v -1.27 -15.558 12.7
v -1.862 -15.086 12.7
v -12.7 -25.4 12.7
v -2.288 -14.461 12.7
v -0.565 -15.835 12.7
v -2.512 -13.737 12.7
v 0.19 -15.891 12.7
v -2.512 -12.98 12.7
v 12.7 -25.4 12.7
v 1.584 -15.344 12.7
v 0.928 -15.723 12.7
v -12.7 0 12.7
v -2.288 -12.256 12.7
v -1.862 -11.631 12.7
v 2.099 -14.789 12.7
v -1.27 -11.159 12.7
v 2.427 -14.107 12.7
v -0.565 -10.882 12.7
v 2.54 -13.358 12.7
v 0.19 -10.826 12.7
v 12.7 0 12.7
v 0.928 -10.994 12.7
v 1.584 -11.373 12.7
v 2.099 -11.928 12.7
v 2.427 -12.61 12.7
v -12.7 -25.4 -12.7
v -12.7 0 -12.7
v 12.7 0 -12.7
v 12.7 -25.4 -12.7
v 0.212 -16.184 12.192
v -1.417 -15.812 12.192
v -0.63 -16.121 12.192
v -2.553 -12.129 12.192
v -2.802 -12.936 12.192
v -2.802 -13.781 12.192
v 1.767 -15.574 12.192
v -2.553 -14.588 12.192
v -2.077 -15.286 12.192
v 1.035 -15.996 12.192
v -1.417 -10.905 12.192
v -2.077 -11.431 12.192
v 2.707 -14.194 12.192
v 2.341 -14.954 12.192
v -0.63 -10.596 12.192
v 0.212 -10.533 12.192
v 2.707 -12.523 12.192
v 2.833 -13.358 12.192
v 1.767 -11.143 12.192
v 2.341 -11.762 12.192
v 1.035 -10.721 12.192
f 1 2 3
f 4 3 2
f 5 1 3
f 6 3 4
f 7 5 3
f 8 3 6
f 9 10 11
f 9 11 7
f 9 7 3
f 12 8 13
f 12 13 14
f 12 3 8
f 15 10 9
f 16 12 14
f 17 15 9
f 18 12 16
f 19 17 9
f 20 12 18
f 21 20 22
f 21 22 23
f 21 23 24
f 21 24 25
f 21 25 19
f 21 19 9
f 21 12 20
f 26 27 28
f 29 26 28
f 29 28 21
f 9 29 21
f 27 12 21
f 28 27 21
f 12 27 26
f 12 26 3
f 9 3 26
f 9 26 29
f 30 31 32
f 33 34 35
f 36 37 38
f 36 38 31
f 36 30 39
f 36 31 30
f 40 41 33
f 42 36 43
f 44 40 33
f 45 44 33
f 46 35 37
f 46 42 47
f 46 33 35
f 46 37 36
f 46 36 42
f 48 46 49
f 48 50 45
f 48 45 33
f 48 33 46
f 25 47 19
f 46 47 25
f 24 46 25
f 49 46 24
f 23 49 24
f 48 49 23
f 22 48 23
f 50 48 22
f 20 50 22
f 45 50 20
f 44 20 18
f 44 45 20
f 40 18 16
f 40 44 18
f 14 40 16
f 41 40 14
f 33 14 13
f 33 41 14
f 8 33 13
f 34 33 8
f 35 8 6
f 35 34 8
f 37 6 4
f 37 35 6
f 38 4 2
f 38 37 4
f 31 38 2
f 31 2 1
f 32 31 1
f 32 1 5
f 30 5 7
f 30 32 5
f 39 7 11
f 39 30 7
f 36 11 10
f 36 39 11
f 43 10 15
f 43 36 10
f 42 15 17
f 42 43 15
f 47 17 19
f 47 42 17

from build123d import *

# Parameters (mm, degrees)
F0_W     = 25.4
F0_H     = 25.4
F1_DEPTH = 25.4
F2_R     = 2.54
F3_DEPTH = 0.508
F3_TAPER = -30


with BuildPart() as f1:
    # F0 (on Front) → F1 (new body)
    with BuildSketch(Plane.XZ):
        Rectangle(F0_W, F0_H)
    extrude(amount=F1_DEPTH)

    # F2 (on face) → F3 (cut)
    with BuildSketch(Plane.XY.offset(12.7)):
        with Locations((0, -13.3584365249)):
            Circle(F2_R)
    extrude(amount=-F3_DEPTH, taper=F3_TAPER, mode=Mode.SUBTRACT)


solid = f1.part
